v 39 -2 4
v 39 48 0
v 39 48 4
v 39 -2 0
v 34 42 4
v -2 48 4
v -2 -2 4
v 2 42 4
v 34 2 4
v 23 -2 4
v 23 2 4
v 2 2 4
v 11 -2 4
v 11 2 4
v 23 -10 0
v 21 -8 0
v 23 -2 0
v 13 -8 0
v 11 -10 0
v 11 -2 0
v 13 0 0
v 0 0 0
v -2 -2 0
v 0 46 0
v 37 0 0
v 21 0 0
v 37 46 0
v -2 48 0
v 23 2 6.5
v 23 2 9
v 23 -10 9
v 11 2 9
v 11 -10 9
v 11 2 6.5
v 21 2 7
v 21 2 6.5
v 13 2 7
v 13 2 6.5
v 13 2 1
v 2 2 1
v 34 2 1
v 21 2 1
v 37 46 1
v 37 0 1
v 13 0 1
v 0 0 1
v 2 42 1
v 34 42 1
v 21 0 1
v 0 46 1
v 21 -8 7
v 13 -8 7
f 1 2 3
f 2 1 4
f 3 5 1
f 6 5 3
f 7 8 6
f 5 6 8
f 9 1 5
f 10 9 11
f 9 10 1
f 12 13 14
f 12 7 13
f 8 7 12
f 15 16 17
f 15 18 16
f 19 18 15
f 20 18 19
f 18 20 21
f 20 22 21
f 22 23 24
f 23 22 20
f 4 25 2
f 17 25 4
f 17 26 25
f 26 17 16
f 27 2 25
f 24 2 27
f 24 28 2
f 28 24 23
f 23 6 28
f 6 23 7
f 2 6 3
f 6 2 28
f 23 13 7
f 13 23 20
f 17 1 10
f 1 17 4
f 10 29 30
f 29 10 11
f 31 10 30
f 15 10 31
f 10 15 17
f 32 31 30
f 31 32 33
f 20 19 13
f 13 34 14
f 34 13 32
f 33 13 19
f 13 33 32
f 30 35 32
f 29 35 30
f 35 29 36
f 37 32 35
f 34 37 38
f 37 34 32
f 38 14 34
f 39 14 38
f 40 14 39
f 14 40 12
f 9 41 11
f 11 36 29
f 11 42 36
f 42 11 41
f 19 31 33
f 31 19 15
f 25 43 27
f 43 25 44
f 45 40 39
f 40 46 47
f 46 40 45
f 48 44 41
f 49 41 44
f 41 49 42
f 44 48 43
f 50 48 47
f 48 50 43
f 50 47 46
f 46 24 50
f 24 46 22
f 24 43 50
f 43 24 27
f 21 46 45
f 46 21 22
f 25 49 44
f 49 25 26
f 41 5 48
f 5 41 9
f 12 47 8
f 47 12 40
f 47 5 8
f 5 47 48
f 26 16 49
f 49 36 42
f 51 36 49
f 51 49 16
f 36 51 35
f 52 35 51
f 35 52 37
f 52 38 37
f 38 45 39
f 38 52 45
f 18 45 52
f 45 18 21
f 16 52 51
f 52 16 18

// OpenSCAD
difference(){
    union(){
    translate ([-2,-2,0]) cube([41, 50, 4]);
    translate ([11,-10,0]) cube([12, 12,9]);
    }
#sensor();
}









module sensor() {

    translate ([0,0,-21]) cube([37, 46, 22]);
    translate ([+2,+2,0]) cube([32, 40, 6.5]);
    translate ([13,-8,0]) cube([8, 10,7]);
}
